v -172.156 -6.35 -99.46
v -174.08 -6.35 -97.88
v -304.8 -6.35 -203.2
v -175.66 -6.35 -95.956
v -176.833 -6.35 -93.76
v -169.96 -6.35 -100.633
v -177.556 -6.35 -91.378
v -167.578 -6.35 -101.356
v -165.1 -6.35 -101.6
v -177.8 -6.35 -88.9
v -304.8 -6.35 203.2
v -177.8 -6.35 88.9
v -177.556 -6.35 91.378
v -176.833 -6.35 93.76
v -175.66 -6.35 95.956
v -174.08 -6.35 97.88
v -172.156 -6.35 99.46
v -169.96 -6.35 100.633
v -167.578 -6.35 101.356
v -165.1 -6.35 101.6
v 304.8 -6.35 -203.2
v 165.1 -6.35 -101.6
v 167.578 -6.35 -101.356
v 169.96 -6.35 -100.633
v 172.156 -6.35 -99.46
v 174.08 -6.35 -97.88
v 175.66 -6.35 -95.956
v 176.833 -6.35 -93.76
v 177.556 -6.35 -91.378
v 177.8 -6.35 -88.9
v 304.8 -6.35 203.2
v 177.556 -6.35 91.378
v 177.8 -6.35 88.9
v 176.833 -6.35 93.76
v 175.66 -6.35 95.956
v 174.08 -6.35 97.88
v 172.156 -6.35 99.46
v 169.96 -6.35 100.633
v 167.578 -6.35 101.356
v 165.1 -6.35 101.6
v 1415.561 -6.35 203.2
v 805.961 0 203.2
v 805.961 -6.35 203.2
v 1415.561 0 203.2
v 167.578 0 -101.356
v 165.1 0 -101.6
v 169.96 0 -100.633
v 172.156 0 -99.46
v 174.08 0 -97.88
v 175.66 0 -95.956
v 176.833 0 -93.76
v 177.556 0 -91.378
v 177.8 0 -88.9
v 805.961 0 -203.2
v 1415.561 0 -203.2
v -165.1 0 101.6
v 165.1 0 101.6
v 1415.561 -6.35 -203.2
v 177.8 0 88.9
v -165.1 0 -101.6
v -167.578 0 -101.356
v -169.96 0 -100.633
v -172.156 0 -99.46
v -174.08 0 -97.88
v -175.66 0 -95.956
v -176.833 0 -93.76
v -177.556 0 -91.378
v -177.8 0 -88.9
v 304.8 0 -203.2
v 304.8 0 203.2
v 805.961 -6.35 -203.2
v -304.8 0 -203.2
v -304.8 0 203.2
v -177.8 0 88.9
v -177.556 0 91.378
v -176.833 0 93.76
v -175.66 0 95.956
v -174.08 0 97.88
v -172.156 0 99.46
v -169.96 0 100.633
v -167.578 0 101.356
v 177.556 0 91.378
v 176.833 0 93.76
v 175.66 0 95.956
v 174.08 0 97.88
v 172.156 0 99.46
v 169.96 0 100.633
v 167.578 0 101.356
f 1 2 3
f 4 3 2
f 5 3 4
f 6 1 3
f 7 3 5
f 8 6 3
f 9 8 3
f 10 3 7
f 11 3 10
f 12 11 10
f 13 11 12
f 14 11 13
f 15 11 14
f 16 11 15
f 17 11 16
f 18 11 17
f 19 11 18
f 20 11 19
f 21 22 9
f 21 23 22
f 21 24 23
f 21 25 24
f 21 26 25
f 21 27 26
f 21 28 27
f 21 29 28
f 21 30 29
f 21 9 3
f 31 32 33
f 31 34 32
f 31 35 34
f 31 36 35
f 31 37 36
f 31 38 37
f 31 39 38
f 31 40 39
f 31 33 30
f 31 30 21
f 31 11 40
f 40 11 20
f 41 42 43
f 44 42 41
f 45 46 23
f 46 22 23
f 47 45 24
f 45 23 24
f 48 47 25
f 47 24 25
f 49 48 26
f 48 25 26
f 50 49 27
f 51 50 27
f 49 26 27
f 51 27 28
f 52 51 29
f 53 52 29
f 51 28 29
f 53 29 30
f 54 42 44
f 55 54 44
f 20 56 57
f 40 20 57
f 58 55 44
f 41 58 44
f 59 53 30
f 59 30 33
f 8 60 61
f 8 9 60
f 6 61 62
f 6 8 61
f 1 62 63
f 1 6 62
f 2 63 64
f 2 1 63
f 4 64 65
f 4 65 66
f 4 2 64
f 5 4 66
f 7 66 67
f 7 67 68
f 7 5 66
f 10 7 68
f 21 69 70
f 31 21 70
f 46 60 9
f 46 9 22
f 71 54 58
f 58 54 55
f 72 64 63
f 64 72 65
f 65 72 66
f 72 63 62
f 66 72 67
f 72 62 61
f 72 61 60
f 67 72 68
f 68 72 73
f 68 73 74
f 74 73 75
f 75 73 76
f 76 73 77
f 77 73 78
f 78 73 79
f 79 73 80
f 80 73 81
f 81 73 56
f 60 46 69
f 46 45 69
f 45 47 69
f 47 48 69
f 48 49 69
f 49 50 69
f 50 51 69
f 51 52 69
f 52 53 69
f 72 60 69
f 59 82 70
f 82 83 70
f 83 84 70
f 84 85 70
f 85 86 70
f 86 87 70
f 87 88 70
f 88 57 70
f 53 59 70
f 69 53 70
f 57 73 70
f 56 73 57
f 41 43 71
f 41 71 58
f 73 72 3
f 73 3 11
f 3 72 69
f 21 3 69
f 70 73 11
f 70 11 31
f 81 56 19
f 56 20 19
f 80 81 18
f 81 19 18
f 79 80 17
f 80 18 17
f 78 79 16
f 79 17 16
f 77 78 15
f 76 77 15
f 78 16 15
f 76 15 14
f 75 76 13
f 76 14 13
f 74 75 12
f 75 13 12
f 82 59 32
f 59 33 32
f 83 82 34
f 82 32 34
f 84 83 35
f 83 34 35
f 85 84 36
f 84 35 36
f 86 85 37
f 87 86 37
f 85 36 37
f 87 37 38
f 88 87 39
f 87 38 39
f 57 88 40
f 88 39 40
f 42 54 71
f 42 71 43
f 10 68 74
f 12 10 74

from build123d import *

# Parameters (mm, degrees)
F0_W     = 609.6
F0_H     = 406.4
F0_W_2   = 355.6
F0_H_2   = 203.2
F1_DEPTH = 6.35
F2_R     = 12.7
F3_W     = 609.6
F3_H     = 406.4
F4_DEPTH = 6.35


with BuildPart() as f1:
    # F0 (on Front) → F1 (new body)
    with BuildSketch(Plane.XZ):
        Rectangle(F0_W, F0_H)
        Rectangle(F0_W_2, F0_H_2, mode=Mode.SUBTRACT)
    extrude(amount=F1_DEPTH)

    # F2
    f2_edges = [f1.edges().sort_by_distance(p)[0] for p in [
        (-177.8, -3.175, 101.6),
        (177.8, -3.175, 101.6),
        (177.8, -3.175, -101.6),
        (-177.8, -3.175, -101.6),
    ]]
    fillet(f2_edges, radius=F2_R)


with BuildPart() as f4:
    # F3 (on Front) → F4 (new body)
    with BuildSketch(Plane.XZ):
        with Locations((1110.761046, 0)):
            Rectangle(F3_W, F3_H)
    extrude(amount=F4_DEPTH)


solid = Compound([f1.part, f4.part])
